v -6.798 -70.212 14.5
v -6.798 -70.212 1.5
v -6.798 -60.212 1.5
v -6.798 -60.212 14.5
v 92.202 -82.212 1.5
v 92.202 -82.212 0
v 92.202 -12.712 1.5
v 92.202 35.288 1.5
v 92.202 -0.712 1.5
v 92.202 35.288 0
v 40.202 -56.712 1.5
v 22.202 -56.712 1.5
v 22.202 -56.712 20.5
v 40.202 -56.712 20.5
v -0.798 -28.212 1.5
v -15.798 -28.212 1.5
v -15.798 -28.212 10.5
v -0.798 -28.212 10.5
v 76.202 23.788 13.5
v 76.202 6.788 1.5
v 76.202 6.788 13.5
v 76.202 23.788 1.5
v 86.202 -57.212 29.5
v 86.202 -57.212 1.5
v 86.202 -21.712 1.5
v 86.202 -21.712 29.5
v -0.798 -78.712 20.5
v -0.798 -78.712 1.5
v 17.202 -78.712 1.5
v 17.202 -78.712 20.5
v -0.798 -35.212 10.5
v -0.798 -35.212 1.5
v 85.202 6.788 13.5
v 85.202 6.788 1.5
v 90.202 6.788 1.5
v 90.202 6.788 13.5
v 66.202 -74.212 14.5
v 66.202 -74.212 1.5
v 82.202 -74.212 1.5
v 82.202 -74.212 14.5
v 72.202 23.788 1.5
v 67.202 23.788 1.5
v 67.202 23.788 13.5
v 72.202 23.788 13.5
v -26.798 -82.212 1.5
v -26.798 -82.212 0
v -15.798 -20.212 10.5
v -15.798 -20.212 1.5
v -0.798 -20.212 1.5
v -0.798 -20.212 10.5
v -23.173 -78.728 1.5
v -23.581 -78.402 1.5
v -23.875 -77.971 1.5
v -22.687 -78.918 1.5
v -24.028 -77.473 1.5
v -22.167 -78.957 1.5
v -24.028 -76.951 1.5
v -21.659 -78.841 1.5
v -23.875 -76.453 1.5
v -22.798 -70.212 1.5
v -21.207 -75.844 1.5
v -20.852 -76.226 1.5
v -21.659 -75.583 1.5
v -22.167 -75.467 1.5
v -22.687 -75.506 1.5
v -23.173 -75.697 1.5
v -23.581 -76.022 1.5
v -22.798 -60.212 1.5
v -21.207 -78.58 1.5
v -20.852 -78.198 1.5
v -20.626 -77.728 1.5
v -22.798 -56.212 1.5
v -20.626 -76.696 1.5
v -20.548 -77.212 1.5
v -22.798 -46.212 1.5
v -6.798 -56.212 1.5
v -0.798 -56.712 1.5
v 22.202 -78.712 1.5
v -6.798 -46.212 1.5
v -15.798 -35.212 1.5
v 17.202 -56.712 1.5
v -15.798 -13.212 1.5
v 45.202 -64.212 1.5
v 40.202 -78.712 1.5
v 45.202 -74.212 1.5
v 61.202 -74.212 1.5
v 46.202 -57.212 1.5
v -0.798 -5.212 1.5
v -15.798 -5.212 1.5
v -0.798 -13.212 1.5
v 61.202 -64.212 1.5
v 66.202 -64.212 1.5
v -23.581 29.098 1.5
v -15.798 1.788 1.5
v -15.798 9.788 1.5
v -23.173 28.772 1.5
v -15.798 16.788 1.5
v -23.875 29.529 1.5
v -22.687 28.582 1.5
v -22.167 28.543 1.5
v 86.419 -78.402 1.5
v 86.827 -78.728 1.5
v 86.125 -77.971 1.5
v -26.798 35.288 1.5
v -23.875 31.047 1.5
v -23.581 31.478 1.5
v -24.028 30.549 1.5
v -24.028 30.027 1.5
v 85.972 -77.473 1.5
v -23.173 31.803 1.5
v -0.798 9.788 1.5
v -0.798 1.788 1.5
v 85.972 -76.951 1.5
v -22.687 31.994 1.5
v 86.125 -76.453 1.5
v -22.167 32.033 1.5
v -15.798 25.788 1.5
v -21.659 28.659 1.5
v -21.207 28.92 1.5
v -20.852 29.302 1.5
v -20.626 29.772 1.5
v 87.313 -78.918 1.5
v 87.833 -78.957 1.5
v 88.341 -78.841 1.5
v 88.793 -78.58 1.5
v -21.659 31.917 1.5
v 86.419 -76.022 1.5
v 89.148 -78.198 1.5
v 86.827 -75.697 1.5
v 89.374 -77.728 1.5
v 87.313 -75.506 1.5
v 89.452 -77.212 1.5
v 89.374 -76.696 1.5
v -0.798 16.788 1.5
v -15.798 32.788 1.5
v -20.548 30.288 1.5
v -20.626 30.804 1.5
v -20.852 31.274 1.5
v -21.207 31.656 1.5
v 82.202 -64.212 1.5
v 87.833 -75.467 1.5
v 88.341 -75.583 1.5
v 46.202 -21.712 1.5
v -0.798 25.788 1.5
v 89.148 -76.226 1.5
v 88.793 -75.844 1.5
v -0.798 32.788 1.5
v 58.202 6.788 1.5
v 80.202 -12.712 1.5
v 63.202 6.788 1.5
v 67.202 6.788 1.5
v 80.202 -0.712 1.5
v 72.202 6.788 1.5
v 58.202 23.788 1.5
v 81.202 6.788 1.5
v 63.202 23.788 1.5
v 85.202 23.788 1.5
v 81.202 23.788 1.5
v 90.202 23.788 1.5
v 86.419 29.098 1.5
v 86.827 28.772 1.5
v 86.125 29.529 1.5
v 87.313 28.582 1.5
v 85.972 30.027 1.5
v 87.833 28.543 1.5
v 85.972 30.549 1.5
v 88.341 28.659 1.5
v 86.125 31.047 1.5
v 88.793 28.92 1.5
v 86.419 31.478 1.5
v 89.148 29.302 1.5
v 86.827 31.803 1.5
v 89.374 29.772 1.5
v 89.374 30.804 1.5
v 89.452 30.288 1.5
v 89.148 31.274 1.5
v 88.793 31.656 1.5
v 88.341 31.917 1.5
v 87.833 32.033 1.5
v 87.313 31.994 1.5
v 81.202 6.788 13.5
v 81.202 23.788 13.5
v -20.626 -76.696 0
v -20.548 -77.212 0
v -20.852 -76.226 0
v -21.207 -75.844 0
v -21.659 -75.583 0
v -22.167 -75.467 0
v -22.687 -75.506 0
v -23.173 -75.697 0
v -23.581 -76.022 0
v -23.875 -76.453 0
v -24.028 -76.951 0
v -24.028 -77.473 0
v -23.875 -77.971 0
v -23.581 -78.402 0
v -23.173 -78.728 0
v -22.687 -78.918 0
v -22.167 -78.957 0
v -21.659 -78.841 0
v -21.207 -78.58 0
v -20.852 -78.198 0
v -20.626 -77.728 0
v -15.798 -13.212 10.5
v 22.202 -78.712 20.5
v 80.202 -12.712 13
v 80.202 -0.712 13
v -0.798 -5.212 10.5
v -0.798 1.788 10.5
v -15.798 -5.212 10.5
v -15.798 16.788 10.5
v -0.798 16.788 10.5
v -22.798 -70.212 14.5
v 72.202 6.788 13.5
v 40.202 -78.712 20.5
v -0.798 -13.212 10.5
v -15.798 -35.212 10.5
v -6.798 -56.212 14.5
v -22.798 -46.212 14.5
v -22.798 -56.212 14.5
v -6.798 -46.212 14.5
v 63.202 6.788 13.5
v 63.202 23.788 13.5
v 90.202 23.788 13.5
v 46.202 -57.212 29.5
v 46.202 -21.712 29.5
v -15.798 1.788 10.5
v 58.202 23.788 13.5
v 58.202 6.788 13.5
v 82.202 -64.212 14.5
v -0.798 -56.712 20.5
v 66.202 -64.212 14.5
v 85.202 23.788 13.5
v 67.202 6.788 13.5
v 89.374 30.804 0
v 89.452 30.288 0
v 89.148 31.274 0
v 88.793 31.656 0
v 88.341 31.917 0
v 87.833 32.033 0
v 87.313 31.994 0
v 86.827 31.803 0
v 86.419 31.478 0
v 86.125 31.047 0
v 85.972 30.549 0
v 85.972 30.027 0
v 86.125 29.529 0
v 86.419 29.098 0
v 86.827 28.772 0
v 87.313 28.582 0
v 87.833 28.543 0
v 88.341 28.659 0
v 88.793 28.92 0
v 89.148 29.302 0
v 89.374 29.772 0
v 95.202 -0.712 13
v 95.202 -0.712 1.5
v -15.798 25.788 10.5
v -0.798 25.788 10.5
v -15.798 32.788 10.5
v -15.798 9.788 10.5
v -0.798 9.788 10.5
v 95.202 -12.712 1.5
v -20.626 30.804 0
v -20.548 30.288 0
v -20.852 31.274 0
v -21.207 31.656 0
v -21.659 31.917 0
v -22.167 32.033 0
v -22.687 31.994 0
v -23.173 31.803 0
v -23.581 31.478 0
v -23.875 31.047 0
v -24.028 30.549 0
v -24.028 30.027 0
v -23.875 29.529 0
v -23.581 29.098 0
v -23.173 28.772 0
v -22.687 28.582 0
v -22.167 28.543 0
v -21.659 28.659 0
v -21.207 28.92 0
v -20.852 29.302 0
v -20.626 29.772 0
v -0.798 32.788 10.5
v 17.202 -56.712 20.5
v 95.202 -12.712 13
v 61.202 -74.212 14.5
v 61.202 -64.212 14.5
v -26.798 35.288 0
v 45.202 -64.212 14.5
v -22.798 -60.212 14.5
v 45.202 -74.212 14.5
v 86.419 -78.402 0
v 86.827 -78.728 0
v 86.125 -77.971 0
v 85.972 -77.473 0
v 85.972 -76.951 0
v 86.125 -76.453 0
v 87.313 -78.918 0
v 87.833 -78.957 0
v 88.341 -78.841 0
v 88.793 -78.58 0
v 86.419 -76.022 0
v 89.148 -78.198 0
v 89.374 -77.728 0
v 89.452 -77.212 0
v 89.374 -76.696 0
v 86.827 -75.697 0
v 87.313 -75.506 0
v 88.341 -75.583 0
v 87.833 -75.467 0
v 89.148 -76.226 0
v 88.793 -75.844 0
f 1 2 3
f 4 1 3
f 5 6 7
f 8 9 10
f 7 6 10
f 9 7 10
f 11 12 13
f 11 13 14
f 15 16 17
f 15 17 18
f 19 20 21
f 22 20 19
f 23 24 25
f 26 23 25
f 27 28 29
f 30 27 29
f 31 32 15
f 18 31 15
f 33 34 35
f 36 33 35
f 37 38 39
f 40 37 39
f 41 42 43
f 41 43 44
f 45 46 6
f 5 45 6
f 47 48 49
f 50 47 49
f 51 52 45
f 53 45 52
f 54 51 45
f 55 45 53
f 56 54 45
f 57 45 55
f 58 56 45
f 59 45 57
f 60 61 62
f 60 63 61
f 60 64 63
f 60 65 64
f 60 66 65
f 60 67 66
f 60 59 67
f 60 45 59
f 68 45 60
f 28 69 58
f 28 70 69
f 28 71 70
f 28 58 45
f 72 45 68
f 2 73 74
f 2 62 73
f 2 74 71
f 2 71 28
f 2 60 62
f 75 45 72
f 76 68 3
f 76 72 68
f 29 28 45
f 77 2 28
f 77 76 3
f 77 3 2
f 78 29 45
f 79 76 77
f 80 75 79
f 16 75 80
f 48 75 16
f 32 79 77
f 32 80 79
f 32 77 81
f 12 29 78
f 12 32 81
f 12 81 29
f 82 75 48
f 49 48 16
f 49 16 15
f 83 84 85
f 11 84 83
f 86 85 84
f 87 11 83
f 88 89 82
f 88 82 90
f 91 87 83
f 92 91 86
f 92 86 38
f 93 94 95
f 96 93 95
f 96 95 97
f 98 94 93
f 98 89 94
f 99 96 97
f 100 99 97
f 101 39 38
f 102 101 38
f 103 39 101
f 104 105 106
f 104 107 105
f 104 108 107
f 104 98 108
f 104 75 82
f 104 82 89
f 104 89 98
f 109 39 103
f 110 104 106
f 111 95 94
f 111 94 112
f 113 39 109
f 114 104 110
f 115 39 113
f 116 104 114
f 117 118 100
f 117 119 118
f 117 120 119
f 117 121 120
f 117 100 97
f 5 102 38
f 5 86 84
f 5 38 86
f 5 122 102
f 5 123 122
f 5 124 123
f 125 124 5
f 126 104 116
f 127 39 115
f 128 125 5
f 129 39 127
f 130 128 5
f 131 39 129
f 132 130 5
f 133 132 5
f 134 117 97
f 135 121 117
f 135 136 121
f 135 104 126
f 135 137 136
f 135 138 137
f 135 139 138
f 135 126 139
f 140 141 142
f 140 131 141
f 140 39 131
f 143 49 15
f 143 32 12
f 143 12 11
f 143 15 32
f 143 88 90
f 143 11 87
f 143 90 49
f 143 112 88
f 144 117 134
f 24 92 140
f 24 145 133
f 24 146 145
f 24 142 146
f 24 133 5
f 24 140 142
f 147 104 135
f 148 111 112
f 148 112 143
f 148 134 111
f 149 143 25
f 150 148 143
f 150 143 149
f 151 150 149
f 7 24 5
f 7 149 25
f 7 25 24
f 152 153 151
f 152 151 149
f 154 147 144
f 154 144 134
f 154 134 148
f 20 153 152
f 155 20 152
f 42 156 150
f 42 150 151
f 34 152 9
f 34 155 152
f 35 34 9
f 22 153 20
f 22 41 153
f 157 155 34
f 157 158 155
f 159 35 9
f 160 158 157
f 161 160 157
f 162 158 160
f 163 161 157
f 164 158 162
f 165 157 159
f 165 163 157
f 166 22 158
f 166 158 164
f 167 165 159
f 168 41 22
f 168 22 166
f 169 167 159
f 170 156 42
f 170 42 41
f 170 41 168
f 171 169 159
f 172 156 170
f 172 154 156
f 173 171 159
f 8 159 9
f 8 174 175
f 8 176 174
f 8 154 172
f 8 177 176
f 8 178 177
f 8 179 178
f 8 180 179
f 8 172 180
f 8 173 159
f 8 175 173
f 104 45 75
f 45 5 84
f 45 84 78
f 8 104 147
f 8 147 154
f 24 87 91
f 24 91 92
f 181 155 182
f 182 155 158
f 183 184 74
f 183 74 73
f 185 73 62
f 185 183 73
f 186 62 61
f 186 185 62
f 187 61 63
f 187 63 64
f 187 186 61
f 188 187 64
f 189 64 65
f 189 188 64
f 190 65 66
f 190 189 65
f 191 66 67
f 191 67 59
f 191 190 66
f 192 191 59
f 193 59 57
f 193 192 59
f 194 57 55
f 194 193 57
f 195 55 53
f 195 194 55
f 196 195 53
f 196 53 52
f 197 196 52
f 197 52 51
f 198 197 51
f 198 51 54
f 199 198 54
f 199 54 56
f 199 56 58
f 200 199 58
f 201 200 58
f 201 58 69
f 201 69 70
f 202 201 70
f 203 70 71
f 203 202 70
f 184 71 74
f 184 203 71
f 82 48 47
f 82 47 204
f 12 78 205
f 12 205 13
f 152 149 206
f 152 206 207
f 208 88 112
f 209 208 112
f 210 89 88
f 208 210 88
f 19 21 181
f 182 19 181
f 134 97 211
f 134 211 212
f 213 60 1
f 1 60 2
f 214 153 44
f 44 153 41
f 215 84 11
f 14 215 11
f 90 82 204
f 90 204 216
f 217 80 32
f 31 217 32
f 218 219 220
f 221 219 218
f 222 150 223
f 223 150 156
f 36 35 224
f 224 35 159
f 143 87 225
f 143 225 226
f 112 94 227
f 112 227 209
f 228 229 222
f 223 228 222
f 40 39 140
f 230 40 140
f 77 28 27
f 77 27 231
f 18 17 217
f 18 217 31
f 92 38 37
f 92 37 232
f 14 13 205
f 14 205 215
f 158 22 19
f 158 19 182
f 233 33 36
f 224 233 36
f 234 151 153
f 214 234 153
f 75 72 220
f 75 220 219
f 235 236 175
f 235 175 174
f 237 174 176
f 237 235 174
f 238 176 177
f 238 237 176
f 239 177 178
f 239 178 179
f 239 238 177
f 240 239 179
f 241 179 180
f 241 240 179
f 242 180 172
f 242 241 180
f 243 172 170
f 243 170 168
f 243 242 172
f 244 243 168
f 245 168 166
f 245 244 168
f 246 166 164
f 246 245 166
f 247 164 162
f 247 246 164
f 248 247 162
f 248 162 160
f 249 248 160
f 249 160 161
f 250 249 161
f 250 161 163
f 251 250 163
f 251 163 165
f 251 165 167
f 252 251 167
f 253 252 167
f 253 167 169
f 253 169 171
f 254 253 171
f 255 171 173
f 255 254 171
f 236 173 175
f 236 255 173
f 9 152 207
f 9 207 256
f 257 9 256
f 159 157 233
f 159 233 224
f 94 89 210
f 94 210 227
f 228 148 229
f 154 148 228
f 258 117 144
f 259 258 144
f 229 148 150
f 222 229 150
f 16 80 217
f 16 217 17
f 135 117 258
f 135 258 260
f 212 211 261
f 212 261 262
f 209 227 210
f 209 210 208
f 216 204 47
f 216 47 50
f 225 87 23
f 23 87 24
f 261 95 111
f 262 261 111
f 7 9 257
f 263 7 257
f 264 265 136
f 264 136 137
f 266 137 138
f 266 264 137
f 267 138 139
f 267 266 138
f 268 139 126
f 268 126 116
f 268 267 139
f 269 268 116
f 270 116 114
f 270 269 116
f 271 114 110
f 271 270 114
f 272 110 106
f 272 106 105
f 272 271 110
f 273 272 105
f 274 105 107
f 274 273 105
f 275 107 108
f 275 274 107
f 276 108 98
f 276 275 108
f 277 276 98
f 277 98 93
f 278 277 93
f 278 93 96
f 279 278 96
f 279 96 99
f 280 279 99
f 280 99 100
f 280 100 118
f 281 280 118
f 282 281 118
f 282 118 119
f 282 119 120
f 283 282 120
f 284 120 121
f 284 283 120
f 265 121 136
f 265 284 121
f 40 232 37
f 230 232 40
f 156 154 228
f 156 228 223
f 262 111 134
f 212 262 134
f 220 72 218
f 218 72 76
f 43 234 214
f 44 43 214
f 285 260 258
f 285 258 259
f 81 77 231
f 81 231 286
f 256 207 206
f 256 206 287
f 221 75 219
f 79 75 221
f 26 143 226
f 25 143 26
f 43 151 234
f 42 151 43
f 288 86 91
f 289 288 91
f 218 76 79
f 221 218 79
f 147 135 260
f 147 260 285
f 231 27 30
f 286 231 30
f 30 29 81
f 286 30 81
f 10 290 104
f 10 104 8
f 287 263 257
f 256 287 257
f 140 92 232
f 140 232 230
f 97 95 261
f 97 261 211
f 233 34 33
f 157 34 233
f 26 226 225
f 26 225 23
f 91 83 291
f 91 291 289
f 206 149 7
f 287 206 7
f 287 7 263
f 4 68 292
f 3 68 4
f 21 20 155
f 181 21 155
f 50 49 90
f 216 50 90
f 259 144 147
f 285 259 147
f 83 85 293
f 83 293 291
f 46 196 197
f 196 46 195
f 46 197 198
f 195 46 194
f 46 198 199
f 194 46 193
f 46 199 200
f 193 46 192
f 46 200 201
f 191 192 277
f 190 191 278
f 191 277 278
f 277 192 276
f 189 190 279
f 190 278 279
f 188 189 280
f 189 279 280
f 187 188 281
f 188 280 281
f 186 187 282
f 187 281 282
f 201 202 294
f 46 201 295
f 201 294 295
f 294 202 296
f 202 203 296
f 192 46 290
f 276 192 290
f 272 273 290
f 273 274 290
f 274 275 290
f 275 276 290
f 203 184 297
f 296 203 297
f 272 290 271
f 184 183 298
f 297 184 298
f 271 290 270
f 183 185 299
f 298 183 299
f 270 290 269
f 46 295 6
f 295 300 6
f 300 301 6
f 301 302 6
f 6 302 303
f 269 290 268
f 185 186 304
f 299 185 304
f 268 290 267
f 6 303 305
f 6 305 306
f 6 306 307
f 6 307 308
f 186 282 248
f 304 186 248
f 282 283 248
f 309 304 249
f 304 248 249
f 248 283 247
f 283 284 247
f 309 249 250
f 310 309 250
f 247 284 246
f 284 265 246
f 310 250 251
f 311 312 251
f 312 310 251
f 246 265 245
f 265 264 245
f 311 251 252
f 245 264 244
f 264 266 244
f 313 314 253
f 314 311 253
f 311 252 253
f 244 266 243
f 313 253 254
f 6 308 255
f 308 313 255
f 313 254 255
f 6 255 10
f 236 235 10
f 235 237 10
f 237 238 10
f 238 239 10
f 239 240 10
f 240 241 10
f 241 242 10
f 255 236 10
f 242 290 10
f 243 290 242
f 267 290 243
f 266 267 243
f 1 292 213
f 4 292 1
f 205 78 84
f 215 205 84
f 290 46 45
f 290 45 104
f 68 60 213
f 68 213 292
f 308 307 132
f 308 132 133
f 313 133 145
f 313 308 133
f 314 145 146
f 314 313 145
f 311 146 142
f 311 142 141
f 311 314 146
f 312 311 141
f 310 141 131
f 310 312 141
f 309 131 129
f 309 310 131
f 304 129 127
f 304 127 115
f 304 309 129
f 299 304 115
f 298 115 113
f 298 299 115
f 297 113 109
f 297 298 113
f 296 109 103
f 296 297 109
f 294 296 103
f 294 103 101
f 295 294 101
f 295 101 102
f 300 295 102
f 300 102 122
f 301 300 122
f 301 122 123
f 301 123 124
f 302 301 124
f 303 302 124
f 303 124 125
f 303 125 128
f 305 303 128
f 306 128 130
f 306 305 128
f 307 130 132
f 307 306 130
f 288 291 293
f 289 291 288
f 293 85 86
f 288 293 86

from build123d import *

# Parameters (mm, degrees)
SKETCH_1_W      = 119
SKETCH_1_H      = 117.5
SKETCH_1_R      = 1.75
EXTRUDE_1_DEPTH = 1.5
SKETCH_2_W      = 15
SKETCH_2_H      = 12
EXTRUDE_2_DEPTH = 11.5
SKETCH_4_W      = 40
SKETCH_4_H      = 35.5
EXTRUDE_3_DEPTH = 28
SKETCH_5_W      = 5
SKETCH_5_H      = 17
EXTRUDE_4_DEPTH = 12
SKETCH_6_W      = 16
SKETCH_6_H      = 10
EXTRUDE_5_DEPTH = 13
SKETCH_7_W      = 18
SKETCH_7_H      = 22
EXTRUDE_6_DEPTH = 19
SKETCH_8_W      = 15
SKETCH_8_H      = 7
EXTRUDE_7_DEPTH = 9
SKETCH_9_W      = 16
SKETCH_9_H      = 10
EXTRUDE_9_DEPTH = 13


with BuildPart() as part:
    # Эскиз1 → Бобышка-Вытянуть1 (new body)
    with BuildSketch(Plane.XY):
        with Locations((32.702043262, -23.462126246)):
            Rectangle(SKETCH_1_W, SKETCH_1_H)
        with Locations((-22.297956738, 30.287873754)):
            Circle(SKETCH_1_R, mode=Mode.SUBTRACT)
        with Locations((87.702043262, 30.287873754)):
            Circle(SKETCH_1_R, mode=Mode.SUBTRACT)
        with Locations((87.702043262, -77.212126246)):
            Circle(SKETCH_1_R, mode=Mode.SUBTRACT)
        with Locations((-22.297956738, -77.212126246)):
            Circle(SKETCH_1_R, mode=Mode.SUBTRACT)
    extrude(amount=EXTRUDE_1_DEPTH)

    # Эскиз2 → Бобышка-Вытянуть2 (add)
    with BuildSketch(Plane.XY.offset(1.5)):
        with Locations((87.702043262, -6.712126246)):
            Rectangle(SKETCH_2_W, SKETCH_2_H)
    extrude(amount=EXTRUDE_2_DEPTH)

    # Эскиз4 → Бобышка-Вытянуть3 (add)
    with BuildSketch(Plane.XY.offset(1.5)):
        with Locations((66.202043262, -39.462126246)):
            Rectangle(SKETCH_4_W, SKETCH_4_H)
    extrude(amount=EXTRUDE_3_DEPTH)

    # Эскиз5 → Бобышка-Вытянуть4 (add)
    with BuildSketch(Plane.XY.offset(1.5)):
        with Locations((87.702043262, 15.287873754)):
            Rectangle(SKETCH_5_W, SKETCH_5_H)
        with Locations((78.702043262, 15.287873754)):
            Rectangle(SKETCH_5_W, SKETCH_5_H)
        with Locations((69.702043262, 15.287873754)):
            Rectangle(SKETCH_5_W, SKETCH_5_H)
        with Locations((60.702043262, 15.287873754)):
            Rectangle(SKETCH_5_W, SKETCH_5_H)
    extrude(amount=EXTRUDE_4_DEPTH)

    # Эскиз6 → Бобышка-Вытянуть5 (add)
    with BuildSketch(Plane.XY.offset(1.5)):
        with Locations((53.202043262, -69.212126246)):
            Rectangle(SKETCH_6_W, SKETCH_6_H)
        with Locations((74.202043262, -69.212126246)):
            Rectangle(SKETCH_6_W, SKETCH_6_H)
    extrude(amount=EXTRUDE_5_DEPTH)

    # Эскиз7 → Бобышка-Вытянуть6 (add)
    with BuildSketch(Plane.XY.offset(1.5)):
        with Locations((31.202043262, -67.712126246)):
            Rectangle(SKETCH_7_W, SKETCH_7_H)
        with Locations((8.202043262, -67.712126246)):
            Rectangle(SKETCH_7_W, SKETCH_7_H)
    extrude(amount=EXTRUDE_6_DEPTH)

    # Эскиз8 → Бобышка-Вытянуть7 (add)
    with BuildSketch(Plane.XY.offset(1.5)):
        with Locations((-8.297956738, 13.287873754)):
            Rectangle(SKETCH_8_W, SKETCH_8_H)
        with Locations((-8.297956738, -1.712126246)):
            Rectangle(SKETCH_8_W, SKETCH_8_H)
        with Locations((-8.297956738, -16.712126246)):
            Rectangle(SKETCH_8_W, SKETCH_8_H)
        with Locations((-8.297956738, -31.712126246)):
            Rectangle(SKETCH_8_W, SKETCH_8_H)
        with Locations((-8.297956738, 29.287873754)):
            Rectangle(SKETCH_8_W, SKETCH_8_H)
    extrude(amount=EXTRUDE_7_DEPTH)

    # Эскиз9 → Бобышка-Вытянуть9 (add)
    with BuildSketch(Plane.XY.offset(1.5)):
        with Locations((-14.797956738, -51.212126246)):
            Rectangle(SKETCH_9_W, SKETCH_9_H)
        with Locations((-14.797956738, -65.212126246)):
            Rectangle(SKETCH_9_W, SKETCH_9_H)
    extrude(amount=EXTRUDE_9_DEPTH)


solid = part.part
